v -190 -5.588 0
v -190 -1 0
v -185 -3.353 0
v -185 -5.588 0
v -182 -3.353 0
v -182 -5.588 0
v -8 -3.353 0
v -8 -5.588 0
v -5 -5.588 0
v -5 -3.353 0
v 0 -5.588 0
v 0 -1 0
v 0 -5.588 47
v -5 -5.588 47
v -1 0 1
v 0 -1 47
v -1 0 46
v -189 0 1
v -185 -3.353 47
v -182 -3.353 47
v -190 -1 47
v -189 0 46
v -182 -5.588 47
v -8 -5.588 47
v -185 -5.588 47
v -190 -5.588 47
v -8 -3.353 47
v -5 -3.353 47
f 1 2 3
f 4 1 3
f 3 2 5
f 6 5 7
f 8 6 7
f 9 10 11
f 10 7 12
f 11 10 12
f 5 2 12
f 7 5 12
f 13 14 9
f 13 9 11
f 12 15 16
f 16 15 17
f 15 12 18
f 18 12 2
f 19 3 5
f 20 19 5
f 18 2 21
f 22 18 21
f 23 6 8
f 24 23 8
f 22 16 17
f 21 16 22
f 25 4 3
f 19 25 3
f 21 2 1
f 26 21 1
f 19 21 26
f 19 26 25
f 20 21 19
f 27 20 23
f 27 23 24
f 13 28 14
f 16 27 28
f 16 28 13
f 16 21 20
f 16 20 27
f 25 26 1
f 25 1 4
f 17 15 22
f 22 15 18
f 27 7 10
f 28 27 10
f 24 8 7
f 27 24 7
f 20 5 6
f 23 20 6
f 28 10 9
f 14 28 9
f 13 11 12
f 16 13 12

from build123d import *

# Parameters (mm, degrees)
F1_DEPTH = 47
F2_SIZE  = 1


with BuildPart() as f1:
    # F0 (on Top) → F1 (new body)
    with BuildSketch(Plane.XY):
        Polygon((0, -5.588235), (0, 0), (-95, 0), (-95, -5.588235), (-8, -5.588235), (-8, -3.352941), (-5, -3.352941), (-5, -5.588235), align=None)
        Polygon((-95, -5.588235), (-95, 0), (-190, 0), (-190, -5.588235), (-185, -5.588235), (-185, -3.352941), (-182, -3.352941), (-182, -5.588235), align=None)
    extrude(amount=F1_DEPTH)

    # F2
    f2_edges = [f1.edges().sort_by_distance(p)[0] for p in [
        (0, 0, 23.5),
        (-95, 0, 47),
        (-190, 0, 23.5),
        (-95, 0, 0),
    ]]
    chamfer(f2_edges, length=F2_SIZE)


solid = f1.part
